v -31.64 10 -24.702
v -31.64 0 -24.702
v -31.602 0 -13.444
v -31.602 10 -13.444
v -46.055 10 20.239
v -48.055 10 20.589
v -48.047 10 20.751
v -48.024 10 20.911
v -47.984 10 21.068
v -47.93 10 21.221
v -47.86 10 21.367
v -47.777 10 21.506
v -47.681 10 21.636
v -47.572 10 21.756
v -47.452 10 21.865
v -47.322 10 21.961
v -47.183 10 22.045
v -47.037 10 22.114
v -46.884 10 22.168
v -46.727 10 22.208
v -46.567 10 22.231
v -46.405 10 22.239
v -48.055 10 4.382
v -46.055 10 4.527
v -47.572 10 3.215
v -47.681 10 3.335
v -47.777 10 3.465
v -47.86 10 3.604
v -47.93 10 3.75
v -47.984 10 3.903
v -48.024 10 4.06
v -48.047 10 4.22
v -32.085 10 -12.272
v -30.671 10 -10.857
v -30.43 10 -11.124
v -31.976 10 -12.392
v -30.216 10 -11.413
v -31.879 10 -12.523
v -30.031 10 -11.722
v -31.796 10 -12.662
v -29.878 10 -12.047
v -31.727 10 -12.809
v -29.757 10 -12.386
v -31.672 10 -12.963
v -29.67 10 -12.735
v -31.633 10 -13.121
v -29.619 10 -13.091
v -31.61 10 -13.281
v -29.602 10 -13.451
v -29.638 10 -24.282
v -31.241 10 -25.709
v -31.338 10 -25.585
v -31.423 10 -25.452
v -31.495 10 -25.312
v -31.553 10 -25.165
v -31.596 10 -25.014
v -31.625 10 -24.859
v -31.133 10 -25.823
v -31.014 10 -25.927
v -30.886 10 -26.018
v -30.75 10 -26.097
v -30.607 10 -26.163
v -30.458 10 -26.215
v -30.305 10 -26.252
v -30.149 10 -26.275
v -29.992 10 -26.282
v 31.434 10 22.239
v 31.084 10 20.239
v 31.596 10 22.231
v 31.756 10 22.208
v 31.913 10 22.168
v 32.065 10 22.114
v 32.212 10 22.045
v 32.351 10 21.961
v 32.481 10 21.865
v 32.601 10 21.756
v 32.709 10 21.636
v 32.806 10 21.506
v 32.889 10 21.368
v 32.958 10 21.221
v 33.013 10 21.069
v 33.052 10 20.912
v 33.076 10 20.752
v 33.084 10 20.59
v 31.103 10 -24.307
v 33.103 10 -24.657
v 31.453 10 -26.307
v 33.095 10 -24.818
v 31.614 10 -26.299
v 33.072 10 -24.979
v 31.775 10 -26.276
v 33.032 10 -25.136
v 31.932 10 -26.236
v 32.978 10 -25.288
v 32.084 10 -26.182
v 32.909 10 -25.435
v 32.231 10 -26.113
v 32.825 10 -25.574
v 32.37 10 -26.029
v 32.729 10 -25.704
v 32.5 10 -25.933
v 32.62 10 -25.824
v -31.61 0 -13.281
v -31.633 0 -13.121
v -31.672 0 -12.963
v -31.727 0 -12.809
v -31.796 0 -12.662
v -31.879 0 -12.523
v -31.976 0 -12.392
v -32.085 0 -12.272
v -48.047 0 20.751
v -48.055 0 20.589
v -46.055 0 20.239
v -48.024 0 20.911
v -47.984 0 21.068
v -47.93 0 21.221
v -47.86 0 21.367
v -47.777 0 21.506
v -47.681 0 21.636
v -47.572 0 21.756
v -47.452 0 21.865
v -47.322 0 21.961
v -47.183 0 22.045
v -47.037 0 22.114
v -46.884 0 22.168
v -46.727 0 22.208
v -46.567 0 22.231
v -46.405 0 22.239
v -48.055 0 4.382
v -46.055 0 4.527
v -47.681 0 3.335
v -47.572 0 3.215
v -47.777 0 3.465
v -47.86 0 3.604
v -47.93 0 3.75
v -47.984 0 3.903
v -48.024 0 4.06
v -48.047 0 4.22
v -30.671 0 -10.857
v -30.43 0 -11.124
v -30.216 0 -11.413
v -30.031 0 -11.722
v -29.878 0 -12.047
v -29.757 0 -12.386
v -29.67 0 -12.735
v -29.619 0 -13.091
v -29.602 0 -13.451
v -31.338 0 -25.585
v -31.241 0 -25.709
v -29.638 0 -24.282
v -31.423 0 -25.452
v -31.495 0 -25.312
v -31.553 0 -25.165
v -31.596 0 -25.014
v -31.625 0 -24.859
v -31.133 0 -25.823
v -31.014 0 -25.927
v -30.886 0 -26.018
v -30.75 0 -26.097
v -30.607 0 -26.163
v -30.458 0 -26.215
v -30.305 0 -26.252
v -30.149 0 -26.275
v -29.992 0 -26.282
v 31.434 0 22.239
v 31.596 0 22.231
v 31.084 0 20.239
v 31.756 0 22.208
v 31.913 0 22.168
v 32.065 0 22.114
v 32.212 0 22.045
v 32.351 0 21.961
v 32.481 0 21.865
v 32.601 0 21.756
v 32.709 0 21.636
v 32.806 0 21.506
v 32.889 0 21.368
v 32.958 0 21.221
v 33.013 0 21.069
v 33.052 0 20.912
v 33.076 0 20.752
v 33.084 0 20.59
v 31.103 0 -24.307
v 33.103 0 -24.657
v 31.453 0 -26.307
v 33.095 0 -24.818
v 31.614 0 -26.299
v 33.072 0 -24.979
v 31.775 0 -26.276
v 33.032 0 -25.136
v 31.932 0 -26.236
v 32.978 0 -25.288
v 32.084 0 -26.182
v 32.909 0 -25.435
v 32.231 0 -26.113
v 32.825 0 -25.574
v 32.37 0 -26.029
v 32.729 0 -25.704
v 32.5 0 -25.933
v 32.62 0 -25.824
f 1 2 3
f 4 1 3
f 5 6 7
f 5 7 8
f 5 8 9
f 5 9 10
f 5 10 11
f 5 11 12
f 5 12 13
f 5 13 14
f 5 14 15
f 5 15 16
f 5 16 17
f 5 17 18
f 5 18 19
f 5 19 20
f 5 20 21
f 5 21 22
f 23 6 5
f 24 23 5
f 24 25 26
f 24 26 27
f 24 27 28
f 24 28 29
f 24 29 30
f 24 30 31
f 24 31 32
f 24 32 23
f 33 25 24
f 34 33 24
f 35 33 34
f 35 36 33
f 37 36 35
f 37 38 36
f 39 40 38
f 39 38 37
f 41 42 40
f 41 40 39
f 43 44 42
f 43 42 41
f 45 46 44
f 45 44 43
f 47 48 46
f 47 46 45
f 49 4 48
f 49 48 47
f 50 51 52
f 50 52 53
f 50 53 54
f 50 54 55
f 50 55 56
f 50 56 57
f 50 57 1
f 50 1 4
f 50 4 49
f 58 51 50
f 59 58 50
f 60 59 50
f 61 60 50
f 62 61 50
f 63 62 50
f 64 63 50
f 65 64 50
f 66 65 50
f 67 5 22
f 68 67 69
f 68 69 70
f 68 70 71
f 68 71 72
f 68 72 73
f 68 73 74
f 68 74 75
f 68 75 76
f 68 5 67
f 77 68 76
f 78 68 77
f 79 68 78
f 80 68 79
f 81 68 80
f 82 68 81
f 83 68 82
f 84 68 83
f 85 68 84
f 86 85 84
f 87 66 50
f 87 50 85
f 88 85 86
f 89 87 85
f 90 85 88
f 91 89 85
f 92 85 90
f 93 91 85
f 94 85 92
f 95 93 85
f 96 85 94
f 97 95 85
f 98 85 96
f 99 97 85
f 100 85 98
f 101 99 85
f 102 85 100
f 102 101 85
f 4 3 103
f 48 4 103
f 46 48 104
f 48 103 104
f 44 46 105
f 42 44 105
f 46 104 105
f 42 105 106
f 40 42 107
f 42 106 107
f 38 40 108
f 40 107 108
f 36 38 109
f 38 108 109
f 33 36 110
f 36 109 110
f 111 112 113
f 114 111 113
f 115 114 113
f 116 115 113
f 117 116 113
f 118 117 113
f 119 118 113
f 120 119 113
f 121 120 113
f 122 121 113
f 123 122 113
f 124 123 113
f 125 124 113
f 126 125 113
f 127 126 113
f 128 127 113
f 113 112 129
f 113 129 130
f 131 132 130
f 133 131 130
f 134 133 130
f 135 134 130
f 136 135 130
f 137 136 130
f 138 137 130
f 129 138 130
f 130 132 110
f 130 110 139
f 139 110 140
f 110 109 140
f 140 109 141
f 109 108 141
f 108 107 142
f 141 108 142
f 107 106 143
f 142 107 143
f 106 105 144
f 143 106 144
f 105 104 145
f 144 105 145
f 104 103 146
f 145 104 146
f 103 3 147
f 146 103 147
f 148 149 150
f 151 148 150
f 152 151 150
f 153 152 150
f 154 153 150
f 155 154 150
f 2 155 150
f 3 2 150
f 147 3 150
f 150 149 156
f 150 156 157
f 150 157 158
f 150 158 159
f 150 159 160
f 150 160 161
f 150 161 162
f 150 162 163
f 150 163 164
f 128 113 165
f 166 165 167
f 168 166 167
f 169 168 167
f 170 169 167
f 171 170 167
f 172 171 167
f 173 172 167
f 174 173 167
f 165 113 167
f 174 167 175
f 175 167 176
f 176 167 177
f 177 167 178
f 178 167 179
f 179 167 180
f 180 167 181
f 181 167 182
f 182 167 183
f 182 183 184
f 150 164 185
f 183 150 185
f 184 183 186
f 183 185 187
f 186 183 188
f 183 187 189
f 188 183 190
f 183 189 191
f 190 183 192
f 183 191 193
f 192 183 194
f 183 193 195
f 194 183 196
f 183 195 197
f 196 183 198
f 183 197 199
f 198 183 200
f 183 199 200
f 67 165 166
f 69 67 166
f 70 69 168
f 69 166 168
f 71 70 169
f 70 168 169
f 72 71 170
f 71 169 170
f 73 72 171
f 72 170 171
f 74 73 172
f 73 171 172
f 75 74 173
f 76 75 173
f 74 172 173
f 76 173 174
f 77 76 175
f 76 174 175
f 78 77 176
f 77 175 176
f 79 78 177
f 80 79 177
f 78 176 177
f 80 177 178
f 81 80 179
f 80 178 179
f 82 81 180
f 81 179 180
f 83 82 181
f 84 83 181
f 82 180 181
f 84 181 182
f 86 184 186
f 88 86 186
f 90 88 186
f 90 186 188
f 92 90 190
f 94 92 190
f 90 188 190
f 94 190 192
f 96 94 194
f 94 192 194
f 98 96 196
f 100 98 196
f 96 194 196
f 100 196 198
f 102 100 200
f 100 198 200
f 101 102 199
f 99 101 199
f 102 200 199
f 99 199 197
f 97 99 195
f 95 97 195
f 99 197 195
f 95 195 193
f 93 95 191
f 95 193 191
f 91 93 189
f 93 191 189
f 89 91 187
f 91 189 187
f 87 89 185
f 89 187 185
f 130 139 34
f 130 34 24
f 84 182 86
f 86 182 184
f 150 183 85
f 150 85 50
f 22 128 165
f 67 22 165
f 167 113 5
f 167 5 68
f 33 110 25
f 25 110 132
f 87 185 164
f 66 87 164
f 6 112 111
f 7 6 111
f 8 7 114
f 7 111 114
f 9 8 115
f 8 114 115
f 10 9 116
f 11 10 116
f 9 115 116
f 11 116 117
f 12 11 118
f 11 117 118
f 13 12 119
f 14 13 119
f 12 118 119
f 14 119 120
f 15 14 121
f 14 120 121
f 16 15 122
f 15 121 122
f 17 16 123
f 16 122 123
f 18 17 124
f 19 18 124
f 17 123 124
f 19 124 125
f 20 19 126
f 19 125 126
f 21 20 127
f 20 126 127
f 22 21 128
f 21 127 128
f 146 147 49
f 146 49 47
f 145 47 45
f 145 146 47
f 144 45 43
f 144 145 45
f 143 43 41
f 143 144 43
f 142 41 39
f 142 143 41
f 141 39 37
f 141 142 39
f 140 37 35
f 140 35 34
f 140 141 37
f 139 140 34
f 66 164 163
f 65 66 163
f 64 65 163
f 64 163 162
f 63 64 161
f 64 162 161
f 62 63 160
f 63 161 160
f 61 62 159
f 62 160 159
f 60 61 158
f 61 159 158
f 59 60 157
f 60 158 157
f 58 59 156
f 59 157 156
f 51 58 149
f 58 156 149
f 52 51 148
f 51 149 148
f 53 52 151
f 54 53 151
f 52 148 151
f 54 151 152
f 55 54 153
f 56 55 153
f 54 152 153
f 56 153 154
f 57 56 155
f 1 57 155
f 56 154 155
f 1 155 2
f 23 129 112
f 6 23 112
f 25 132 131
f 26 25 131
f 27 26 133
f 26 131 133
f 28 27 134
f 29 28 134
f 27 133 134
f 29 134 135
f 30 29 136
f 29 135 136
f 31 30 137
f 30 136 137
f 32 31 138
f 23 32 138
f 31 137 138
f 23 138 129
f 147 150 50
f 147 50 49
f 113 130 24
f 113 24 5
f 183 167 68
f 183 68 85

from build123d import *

# Parameters (mm, degrees)
EXTRUDE_THIN1_DEPTH = 10


with BuildPart() as part:
    # Sketch1 → Extrude-Thin1 (new body)
    with BuildSketch(Plane(origin=(0, 0, 0), x_dir=(1, 0, 0), z_dir=(0, 1, 0))):
        with BuildLine():
            Line((-48.055213063, -4.381670713), (-48.055213063, -20.589409576))
            ThreePointArc((-48.055213063, -20.589409576), (-47.571938312, -21.756136971), (-46.405210296, -22.239410221))
            Line((-46.405210296, -22.239410221), (31.434177514, -22.239310121))
            ThreePointArc((31.434177514, -22.239310121), (32.600656469, -21.756281638), (33.08417589, -20.590006097))
            Line((33.08417589, -20.590006097), (33.103278784, 24.656648645))
            ThreePointArc((33.103278784, 24.656648645), (32.62001265, 25.824064412), (31.452603406, 26.307346307))
            Line((31.452603406, 26.307346307), (-29.991737035, 26.282239879))
            ThreePointArc((-29.991737035, 26.282239879), (-31.133079443, 25.823165706), (-31.639590763, 24.702068979))
            Line((-31.639590763, 24.702068979), (-31.602092863, 13.443859379))
            ThreePointArc((-31.602092863, 13.443859379), (-31.726631593, 12.809477673), (-32.0853545, 12.271641341))
            Line((-32.0853545, 12.271641341), (-47.571938464, -3.214942622))
            ThreePointArc((-47.571938464, -3.214942622), (-47.929614086, -3.75024202), (-48.055213063, -4.381670713))
        make_face()
        with BuildLine():
            Line((-46.055213063, -4.526644346), (-46.055213063, -20.239409771))
            Line((-46.055213063, -20.239409771), (31.084323774, -20.239310571))
            Line((31.084323774, -20.239310571), (31.103131072, 24.307203344))
            Line((31.103131072, 24.307203344), (-29.638181818, 24.282384176))
            Line((-29.638181818, 24.282384176), (-29.602103962, 13.4505225))
            ThreePointArc((-29.602103962, 13.4505225), (-29.877600157, 12.047189835), (-30.671140938, 10.857427779))
            Line((-30.671140938, 10.857427779), (-46.055213063, -4.526644346))
        make_face(mode=Mode.SUBTRACT)
    extrude(amount=EXTRUDE_THIN1_DEPTH)


solid = part.part
